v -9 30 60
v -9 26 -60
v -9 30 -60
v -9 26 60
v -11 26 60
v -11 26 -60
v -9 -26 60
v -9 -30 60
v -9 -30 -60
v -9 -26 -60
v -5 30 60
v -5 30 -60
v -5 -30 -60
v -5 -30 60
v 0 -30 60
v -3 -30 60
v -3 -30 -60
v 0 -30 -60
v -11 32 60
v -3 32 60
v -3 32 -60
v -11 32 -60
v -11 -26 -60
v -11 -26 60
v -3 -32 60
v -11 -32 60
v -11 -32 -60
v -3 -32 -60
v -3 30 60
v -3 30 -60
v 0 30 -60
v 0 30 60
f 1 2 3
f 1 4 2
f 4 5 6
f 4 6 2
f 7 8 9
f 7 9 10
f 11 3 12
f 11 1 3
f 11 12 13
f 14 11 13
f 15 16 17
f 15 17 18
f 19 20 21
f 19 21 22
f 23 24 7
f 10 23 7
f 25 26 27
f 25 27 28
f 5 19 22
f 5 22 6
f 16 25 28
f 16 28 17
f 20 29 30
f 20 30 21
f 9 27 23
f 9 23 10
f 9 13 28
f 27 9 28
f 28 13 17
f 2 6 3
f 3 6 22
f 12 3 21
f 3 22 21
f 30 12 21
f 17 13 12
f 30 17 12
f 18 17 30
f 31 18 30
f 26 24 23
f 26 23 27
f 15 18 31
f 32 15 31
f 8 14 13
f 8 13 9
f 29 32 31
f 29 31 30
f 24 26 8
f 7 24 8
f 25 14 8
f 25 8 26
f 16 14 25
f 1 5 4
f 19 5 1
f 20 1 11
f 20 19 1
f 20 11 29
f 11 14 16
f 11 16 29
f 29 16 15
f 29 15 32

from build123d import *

# Parameters (mm, degrees)
F0_W          = 2
F0_H          = 4
F0_H_2        = 2
F1_DEPTH      = 60
F1_DEPTH_BACK = 60


with BuildPart() as f1:
    # F0 (on Top) → F1 (new body, two sides)
    with BuildSketch(Plane.XY) as f1_sk:
        Polygon((-3, 30), (-5, 30), (-5, 23.5), (-5, -23.5), (-5, -30), (-3, -30), (0, -30), (0, 30), align=None)
        Polygon((-9, 30), (-5, 30), (-3, 30), (-3, 32), (-9, 32), align=None)
        with Locations((-10, 28)):
            Rectangle(F0_W, F0_H)
        with Locations((-10, 31)):
            Rectangle(F0_W, F0_H_2)
        Polygon((-3, -30), (-5, -30), (-9, -30), (-9, -32), (-3, -32), align=None)
        with Locations((-10, -31)):
            Rectangle(F0_W, F0_H_2)
        with Locations((-10, -28)):
            Rectangle(F0_W, F0_H)
    extrude(amount=F1_DEPTH)
    extrude(f1_sk.sketch, amount=-F1_DEPTH_BACK)


solid = f1.part
